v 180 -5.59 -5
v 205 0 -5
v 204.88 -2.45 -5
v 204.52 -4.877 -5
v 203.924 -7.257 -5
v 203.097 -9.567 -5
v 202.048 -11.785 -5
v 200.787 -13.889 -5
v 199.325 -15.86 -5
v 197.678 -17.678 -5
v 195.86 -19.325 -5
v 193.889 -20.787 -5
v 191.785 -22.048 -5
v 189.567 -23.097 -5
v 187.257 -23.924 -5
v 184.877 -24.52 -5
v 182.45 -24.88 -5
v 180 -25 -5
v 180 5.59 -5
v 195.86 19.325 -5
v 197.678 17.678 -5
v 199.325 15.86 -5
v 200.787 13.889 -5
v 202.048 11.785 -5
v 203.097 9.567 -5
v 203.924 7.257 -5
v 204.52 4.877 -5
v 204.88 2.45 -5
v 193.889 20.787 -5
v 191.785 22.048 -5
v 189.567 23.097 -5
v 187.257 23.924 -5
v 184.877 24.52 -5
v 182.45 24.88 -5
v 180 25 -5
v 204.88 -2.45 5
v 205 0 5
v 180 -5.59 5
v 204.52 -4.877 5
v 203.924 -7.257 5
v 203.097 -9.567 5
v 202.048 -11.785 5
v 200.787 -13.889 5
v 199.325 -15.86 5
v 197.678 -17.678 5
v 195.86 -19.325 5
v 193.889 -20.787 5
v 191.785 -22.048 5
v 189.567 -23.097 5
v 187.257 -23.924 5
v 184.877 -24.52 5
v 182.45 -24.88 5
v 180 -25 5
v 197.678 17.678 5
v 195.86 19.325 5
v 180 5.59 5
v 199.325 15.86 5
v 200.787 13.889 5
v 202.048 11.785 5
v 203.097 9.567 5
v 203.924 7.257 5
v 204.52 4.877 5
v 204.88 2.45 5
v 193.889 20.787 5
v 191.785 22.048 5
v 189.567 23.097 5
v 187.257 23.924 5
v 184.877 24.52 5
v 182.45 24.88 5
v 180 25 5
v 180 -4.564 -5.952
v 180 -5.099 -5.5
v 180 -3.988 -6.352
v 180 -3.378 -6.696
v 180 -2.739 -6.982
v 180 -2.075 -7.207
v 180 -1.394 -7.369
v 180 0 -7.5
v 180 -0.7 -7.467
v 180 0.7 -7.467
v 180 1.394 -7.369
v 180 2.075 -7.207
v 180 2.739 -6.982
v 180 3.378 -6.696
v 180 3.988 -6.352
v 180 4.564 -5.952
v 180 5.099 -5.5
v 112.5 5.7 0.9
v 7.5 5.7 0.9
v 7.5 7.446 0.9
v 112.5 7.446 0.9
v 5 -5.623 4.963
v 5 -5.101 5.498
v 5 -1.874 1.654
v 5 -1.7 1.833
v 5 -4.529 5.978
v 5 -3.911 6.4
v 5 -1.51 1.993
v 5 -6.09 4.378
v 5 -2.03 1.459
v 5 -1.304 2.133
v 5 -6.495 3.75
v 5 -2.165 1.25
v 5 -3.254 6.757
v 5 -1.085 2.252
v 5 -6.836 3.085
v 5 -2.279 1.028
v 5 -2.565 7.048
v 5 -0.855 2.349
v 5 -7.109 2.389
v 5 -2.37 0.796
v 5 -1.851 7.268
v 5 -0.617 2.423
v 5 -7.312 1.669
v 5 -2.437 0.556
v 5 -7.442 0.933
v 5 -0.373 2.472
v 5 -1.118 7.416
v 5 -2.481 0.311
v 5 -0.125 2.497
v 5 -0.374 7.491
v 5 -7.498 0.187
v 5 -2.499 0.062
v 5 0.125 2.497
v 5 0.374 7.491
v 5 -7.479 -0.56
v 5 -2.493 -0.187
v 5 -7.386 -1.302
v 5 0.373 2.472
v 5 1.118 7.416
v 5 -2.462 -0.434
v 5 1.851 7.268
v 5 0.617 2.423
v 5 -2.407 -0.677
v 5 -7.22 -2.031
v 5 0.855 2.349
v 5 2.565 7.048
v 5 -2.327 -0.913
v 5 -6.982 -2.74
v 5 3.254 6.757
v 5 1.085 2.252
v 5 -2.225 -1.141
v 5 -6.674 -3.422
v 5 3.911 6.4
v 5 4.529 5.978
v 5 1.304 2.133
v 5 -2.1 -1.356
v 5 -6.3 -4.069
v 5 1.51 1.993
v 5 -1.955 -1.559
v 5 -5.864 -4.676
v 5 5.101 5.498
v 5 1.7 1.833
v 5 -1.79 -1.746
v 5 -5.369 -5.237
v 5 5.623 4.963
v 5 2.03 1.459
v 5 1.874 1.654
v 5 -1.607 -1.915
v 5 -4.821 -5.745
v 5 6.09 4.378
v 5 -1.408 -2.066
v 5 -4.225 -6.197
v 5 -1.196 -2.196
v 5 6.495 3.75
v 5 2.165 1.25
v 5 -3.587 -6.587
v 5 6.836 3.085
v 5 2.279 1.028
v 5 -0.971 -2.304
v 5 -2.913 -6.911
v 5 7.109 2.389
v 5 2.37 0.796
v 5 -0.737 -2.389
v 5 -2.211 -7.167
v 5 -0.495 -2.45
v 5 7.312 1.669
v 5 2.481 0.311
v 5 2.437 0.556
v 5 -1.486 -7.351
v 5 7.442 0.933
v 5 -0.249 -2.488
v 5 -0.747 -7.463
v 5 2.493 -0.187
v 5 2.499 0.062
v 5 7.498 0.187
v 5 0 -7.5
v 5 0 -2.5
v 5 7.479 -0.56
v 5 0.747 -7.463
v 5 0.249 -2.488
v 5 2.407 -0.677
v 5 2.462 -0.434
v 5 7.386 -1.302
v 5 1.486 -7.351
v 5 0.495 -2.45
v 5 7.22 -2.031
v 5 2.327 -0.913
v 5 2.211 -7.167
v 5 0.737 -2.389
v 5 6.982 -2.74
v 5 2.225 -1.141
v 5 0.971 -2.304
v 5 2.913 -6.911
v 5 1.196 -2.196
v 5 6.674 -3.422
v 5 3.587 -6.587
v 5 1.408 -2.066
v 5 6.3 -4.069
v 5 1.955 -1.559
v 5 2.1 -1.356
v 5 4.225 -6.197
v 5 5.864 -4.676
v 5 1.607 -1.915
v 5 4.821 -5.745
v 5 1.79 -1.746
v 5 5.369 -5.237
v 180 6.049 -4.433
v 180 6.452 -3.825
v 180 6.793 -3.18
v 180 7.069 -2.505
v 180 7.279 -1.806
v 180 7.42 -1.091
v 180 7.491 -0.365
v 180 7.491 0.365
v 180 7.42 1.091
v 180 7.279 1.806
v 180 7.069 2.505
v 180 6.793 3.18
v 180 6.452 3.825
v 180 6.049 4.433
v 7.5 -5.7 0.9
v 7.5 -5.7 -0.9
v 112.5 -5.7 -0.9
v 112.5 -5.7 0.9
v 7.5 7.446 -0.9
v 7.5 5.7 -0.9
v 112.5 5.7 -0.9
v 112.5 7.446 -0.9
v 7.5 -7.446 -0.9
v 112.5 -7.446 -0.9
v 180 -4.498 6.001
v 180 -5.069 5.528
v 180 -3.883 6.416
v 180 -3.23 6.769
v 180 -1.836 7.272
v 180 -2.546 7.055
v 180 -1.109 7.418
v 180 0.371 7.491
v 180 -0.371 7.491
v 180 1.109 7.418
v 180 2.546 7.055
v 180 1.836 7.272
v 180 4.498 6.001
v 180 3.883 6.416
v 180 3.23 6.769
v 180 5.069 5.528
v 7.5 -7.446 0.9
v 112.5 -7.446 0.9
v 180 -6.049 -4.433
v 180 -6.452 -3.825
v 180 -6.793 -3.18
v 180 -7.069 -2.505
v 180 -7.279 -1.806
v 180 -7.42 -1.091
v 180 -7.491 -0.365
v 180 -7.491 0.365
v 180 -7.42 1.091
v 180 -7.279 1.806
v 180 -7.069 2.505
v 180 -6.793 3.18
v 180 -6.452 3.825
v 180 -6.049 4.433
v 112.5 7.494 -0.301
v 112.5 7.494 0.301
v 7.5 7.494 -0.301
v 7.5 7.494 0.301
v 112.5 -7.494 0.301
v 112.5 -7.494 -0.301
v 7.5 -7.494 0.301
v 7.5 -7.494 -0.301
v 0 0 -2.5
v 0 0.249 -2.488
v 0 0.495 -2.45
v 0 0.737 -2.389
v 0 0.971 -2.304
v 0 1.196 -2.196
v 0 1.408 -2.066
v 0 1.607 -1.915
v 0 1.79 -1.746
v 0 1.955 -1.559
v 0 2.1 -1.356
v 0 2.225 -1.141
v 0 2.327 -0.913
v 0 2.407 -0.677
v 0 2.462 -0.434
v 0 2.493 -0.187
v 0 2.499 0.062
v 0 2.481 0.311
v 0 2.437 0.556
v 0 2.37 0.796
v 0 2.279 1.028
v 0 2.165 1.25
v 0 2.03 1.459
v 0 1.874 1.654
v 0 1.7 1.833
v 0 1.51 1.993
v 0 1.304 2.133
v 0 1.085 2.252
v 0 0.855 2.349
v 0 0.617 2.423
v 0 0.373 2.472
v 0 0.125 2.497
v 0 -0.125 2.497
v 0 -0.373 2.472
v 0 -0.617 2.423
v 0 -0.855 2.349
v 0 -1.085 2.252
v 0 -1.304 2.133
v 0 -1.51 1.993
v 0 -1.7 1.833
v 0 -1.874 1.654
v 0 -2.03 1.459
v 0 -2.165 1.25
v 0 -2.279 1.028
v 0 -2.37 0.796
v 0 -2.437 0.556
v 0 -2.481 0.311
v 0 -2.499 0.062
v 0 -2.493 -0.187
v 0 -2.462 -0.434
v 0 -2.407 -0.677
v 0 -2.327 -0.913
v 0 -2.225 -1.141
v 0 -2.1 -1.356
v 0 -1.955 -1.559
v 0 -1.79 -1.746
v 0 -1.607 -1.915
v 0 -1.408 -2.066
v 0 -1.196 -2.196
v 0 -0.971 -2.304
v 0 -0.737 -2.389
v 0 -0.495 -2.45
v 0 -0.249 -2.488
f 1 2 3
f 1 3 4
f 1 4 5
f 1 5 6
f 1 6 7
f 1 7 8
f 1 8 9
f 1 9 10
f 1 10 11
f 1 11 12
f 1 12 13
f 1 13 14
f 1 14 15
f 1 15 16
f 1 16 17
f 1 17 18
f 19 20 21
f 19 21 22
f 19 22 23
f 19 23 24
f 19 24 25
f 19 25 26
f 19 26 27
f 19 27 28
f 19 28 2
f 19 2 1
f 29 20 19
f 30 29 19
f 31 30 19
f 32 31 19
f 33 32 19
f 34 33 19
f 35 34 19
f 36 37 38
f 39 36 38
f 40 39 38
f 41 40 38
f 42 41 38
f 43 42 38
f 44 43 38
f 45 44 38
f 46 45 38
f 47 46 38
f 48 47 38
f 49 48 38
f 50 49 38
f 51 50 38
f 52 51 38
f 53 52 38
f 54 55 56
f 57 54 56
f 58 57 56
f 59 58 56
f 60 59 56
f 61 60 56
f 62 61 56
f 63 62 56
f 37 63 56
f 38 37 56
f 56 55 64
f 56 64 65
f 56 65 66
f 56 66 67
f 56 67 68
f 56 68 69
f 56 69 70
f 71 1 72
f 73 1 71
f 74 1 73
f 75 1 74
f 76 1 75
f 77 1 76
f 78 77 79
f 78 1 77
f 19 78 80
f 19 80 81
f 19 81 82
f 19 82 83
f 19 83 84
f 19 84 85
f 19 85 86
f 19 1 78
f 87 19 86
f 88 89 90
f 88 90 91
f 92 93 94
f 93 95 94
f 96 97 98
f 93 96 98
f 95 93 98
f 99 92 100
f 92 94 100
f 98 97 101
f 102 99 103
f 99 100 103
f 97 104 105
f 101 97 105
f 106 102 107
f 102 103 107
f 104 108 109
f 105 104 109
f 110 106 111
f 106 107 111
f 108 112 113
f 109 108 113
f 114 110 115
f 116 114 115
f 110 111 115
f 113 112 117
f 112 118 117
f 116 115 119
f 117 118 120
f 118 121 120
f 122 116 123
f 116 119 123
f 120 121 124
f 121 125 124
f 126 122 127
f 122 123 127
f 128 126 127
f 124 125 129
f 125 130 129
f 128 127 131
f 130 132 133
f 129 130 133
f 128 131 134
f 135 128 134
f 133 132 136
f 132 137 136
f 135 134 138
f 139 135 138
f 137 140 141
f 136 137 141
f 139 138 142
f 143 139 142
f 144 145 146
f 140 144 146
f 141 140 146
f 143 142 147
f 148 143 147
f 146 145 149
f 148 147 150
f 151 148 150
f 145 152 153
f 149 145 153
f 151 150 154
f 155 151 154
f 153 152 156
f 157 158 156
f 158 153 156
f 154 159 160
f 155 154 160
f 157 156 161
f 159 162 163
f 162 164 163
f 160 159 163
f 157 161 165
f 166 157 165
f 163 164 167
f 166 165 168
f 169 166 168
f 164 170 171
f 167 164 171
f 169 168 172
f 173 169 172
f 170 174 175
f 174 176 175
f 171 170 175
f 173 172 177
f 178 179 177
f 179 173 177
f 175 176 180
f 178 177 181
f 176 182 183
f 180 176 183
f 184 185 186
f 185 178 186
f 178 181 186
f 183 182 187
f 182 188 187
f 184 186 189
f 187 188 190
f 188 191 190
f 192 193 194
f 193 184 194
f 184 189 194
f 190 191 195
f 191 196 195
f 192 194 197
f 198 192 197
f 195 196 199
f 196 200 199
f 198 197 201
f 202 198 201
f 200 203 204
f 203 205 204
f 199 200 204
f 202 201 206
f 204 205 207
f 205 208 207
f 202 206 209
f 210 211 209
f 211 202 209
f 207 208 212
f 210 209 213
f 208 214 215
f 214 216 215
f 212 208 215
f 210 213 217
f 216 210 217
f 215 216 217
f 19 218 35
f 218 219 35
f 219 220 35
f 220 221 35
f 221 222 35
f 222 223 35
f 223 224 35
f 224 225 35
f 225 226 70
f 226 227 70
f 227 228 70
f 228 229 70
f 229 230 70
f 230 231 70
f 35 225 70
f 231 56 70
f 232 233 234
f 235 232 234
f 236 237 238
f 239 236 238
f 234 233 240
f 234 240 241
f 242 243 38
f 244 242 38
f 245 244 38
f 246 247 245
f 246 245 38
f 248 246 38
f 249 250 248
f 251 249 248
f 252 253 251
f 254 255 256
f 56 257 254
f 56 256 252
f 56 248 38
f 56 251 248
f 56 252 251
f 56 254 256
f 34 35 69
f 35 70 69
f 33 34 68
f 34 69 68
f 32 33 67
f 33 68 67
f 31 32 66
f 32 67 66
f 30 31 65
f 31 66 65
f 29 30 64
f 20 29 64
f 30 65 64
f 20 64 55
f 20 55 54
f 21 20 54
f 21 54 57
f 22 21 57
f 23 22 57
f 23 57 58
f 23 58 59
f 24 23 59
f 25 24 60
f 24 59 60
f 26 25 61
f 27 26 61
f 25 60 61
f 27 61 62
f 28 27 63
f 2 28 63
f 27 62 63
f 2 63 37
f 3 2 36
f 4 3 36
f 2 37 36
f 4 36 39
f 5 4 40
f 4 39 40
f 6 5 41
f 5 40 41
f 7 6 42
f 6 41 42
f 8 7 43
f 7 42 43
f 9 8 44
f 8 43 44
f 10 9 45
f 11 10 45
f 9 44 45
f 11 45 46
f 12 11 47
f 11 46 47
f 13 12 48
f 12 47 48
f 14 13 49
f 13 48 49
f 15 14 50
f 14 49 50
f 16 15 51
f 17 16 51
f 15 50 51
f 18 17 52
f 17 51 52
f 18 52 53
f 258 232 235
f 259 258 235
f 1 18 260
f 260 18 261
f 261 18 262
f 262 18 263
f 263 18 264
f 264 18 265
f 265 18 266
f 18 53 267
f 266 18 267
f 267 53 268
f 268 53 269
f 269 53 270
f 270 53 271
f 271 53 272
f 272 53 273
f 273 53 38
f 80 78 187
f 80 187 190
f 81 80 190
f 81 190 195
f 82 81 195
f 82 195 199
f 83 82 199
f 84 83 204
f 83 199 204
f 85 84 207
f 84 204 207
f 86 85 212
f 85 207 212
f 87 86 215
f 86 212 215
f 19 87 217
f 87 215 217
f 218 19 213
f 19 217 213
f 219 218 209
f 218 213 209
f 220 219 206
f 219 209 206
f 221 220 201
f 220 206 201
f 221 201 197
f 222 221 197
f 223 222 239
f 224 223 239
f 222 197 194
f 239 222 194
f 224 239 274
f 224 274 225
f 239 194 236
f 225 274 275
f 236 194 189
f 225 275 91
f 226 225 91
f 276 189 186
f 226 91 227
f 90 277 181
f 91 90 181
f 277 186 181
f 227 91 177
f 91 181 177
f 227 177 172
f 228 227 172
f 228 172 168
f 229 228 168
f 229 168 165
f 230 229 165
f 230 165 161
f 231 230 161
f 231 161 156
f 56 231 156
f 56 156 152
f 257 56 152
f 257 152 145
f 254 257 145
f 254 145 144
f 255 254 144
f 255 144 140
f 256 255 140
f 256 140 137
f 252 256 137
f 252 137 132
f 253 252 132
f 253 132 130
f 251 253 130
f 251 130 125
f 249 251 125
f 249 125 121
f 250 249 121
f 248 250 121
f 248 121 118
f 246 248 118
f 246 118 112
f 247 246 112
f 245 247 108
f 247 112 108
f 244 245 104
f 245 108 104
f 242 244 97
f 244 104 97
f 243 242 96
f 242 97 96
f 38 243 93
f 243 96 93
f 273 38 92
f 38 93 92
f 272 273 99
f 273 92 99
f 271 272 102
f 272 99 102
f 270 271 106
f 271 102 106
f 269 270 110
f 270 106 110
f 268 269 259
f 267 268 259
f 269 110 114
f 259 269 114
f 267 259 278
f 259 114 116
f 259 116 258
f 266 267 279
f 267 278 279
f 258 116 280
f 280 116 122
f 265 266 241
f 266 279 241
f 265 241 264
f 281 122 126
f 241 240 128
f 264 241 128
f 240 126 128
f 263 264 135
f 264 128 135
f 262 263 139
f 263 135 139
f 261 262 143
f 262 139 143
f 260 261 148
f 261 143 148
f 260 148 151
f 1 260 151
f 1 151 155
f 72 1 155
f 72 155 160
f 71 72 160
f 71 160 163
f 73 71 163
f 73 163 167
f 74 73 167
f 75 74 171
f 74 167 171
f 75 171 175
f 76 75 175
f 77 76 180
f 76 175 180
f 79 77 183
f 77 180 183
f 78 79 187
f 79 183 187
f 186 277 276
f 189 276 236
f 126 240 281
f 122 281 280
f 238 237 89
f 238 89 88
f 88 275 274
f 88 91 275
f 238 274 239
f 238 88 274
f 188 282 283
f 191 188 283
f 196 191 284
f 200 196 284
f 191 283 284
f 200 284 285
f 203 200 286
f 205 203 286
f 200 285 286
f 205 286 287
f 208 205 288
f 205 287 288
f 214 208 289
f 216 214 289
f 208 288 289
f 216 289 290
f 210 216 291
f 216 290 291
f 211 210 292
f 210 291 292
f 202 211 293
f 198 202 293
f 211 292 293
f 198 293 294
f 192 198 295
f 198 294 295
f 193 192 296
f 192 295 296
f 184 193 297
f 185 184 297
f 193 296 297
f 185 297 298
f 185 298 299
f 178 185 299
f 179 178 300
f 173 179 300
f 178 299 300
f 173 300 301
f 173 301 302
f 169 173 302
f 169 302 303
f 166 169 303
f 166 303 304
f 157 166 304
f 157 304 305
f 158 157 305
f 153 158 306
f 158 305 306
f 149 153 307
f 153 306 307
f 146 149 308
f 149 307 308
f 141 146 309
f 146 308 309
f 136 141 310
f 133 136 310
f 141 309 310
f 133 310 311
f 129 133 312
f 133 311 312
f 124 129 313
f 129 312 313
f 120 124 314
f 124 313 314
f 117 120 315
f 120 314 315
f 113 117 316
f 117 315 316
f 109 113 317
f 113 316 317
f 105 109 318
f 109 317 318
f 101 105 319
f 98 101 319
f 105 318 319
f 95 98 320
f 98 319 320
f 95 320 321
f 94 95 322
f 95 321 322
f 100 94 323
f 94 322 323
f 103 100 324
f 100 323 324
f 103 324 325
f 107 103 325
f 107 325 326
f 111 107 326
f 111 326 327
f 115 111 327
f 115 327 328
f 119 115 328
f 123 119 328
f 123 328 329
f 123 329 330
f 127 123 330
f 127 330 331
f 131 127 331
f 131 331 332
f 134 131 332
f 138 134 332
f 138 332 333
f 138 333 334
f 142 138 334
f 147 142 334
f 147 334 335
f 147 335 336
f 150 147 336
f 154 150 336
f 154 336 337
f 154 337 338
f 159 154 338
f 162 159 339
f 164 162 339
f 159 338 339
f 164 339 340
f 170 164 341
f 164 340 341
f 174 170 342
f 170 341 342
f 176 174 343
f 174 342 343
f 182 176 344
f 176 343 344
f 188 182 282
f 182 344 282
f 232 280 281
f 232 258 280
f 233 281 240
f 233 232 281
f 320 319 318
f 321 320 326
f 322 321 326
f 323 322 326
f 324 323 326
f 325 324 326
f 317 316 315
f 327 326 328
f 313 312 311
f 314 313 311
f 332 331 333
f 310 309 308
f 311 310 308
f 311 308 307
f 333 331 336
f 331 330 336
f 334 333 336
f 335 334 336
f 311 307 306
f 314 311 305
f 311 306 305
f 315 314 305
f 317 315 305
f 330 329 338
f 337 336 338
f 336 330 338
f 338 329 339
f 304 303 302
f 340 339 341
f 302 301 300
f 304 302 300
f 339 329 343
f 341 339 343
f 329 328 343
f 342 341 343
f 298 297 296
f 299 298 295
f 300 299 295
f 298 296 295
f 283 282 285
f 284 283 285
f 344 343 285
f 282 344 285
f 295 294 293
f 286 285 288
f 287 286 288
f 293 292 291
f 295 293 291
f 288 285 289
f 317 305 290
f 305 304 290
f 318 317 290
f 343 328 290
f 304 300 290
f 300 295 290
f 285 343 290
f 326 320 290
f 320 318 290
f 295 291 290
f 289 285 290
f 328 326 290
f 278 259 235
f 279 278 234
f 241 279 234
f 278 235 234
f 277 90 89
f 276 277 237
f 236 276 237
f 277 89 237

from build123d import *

# Parameters (mm, degrees)
SKETCH1_R           = 2.5
BOSS_EXTRUDE1_DEPTH = 5
SKETCH2_R           = 7.5
BOSS_EXTRUDE2_DEPTH = 175
BOSS_EXTRUDE3_DEPTH = 5
SKETCH4_W           = 105
SKETCH4_H           = 1.8
CUT_EXTRUDE1_DEPTH  = 1.8


with BuildPart() as part:
    # Sketch1 → Boss-Extrude1 (new body)
    with BuildSketch(Plane(origin=(0, 0, 0), x_dir=(0, 0, -1), z_dir=(1, 0, 0))):
        Circle(SKETCH1_R)
    extrude(amount=BOSS_EXTRUDE1_DEPTH)

    # Sketch2 → Boss-Extrude2 (add)
    with BuildSketch(Plane(origin=(5, 0, 0), x_dir=(0, 0, -1), z_dir=(1, 0, 0))):
        Circle(SKETCH2_R)
    extrude(amount=BOSS_EXTRUDE2_DEPTH)

    # Sketch3 → Boss-Extrude3 (add, symmetric)
    with BuildSketch(Plane.XY):
        with BuildLine():
            Line((180, -25), (180, 25))
            ThreePointArc((180, 25), (205, 0), (180, -25))
        make_face()
    extrude(amount=BOSS_EXTRUDE3_DEPTH, both=True)

    # Sketch4 → Cut-Extrude1 (cut)
    with BuildSketch(Plane(origin=(0, 5.7, 0), x_dir=(1, 0, 0), z_dir=(0, 1, 0))):
        with Locations((60, 0)):
            Rectangle(SKETCH4_W, SKETCH4_H)
    cut_extrude1 = extrude(amount=CUT_EXTRUDE1_DEPTH, mode=Mode.SUBTRACT)

    # Mirror1: Cut-Extrude1 across plane
    add(cut_extrude1.mirror(Plane.ZX), mode=Mode.SUBTRACT)


solid = part.part
